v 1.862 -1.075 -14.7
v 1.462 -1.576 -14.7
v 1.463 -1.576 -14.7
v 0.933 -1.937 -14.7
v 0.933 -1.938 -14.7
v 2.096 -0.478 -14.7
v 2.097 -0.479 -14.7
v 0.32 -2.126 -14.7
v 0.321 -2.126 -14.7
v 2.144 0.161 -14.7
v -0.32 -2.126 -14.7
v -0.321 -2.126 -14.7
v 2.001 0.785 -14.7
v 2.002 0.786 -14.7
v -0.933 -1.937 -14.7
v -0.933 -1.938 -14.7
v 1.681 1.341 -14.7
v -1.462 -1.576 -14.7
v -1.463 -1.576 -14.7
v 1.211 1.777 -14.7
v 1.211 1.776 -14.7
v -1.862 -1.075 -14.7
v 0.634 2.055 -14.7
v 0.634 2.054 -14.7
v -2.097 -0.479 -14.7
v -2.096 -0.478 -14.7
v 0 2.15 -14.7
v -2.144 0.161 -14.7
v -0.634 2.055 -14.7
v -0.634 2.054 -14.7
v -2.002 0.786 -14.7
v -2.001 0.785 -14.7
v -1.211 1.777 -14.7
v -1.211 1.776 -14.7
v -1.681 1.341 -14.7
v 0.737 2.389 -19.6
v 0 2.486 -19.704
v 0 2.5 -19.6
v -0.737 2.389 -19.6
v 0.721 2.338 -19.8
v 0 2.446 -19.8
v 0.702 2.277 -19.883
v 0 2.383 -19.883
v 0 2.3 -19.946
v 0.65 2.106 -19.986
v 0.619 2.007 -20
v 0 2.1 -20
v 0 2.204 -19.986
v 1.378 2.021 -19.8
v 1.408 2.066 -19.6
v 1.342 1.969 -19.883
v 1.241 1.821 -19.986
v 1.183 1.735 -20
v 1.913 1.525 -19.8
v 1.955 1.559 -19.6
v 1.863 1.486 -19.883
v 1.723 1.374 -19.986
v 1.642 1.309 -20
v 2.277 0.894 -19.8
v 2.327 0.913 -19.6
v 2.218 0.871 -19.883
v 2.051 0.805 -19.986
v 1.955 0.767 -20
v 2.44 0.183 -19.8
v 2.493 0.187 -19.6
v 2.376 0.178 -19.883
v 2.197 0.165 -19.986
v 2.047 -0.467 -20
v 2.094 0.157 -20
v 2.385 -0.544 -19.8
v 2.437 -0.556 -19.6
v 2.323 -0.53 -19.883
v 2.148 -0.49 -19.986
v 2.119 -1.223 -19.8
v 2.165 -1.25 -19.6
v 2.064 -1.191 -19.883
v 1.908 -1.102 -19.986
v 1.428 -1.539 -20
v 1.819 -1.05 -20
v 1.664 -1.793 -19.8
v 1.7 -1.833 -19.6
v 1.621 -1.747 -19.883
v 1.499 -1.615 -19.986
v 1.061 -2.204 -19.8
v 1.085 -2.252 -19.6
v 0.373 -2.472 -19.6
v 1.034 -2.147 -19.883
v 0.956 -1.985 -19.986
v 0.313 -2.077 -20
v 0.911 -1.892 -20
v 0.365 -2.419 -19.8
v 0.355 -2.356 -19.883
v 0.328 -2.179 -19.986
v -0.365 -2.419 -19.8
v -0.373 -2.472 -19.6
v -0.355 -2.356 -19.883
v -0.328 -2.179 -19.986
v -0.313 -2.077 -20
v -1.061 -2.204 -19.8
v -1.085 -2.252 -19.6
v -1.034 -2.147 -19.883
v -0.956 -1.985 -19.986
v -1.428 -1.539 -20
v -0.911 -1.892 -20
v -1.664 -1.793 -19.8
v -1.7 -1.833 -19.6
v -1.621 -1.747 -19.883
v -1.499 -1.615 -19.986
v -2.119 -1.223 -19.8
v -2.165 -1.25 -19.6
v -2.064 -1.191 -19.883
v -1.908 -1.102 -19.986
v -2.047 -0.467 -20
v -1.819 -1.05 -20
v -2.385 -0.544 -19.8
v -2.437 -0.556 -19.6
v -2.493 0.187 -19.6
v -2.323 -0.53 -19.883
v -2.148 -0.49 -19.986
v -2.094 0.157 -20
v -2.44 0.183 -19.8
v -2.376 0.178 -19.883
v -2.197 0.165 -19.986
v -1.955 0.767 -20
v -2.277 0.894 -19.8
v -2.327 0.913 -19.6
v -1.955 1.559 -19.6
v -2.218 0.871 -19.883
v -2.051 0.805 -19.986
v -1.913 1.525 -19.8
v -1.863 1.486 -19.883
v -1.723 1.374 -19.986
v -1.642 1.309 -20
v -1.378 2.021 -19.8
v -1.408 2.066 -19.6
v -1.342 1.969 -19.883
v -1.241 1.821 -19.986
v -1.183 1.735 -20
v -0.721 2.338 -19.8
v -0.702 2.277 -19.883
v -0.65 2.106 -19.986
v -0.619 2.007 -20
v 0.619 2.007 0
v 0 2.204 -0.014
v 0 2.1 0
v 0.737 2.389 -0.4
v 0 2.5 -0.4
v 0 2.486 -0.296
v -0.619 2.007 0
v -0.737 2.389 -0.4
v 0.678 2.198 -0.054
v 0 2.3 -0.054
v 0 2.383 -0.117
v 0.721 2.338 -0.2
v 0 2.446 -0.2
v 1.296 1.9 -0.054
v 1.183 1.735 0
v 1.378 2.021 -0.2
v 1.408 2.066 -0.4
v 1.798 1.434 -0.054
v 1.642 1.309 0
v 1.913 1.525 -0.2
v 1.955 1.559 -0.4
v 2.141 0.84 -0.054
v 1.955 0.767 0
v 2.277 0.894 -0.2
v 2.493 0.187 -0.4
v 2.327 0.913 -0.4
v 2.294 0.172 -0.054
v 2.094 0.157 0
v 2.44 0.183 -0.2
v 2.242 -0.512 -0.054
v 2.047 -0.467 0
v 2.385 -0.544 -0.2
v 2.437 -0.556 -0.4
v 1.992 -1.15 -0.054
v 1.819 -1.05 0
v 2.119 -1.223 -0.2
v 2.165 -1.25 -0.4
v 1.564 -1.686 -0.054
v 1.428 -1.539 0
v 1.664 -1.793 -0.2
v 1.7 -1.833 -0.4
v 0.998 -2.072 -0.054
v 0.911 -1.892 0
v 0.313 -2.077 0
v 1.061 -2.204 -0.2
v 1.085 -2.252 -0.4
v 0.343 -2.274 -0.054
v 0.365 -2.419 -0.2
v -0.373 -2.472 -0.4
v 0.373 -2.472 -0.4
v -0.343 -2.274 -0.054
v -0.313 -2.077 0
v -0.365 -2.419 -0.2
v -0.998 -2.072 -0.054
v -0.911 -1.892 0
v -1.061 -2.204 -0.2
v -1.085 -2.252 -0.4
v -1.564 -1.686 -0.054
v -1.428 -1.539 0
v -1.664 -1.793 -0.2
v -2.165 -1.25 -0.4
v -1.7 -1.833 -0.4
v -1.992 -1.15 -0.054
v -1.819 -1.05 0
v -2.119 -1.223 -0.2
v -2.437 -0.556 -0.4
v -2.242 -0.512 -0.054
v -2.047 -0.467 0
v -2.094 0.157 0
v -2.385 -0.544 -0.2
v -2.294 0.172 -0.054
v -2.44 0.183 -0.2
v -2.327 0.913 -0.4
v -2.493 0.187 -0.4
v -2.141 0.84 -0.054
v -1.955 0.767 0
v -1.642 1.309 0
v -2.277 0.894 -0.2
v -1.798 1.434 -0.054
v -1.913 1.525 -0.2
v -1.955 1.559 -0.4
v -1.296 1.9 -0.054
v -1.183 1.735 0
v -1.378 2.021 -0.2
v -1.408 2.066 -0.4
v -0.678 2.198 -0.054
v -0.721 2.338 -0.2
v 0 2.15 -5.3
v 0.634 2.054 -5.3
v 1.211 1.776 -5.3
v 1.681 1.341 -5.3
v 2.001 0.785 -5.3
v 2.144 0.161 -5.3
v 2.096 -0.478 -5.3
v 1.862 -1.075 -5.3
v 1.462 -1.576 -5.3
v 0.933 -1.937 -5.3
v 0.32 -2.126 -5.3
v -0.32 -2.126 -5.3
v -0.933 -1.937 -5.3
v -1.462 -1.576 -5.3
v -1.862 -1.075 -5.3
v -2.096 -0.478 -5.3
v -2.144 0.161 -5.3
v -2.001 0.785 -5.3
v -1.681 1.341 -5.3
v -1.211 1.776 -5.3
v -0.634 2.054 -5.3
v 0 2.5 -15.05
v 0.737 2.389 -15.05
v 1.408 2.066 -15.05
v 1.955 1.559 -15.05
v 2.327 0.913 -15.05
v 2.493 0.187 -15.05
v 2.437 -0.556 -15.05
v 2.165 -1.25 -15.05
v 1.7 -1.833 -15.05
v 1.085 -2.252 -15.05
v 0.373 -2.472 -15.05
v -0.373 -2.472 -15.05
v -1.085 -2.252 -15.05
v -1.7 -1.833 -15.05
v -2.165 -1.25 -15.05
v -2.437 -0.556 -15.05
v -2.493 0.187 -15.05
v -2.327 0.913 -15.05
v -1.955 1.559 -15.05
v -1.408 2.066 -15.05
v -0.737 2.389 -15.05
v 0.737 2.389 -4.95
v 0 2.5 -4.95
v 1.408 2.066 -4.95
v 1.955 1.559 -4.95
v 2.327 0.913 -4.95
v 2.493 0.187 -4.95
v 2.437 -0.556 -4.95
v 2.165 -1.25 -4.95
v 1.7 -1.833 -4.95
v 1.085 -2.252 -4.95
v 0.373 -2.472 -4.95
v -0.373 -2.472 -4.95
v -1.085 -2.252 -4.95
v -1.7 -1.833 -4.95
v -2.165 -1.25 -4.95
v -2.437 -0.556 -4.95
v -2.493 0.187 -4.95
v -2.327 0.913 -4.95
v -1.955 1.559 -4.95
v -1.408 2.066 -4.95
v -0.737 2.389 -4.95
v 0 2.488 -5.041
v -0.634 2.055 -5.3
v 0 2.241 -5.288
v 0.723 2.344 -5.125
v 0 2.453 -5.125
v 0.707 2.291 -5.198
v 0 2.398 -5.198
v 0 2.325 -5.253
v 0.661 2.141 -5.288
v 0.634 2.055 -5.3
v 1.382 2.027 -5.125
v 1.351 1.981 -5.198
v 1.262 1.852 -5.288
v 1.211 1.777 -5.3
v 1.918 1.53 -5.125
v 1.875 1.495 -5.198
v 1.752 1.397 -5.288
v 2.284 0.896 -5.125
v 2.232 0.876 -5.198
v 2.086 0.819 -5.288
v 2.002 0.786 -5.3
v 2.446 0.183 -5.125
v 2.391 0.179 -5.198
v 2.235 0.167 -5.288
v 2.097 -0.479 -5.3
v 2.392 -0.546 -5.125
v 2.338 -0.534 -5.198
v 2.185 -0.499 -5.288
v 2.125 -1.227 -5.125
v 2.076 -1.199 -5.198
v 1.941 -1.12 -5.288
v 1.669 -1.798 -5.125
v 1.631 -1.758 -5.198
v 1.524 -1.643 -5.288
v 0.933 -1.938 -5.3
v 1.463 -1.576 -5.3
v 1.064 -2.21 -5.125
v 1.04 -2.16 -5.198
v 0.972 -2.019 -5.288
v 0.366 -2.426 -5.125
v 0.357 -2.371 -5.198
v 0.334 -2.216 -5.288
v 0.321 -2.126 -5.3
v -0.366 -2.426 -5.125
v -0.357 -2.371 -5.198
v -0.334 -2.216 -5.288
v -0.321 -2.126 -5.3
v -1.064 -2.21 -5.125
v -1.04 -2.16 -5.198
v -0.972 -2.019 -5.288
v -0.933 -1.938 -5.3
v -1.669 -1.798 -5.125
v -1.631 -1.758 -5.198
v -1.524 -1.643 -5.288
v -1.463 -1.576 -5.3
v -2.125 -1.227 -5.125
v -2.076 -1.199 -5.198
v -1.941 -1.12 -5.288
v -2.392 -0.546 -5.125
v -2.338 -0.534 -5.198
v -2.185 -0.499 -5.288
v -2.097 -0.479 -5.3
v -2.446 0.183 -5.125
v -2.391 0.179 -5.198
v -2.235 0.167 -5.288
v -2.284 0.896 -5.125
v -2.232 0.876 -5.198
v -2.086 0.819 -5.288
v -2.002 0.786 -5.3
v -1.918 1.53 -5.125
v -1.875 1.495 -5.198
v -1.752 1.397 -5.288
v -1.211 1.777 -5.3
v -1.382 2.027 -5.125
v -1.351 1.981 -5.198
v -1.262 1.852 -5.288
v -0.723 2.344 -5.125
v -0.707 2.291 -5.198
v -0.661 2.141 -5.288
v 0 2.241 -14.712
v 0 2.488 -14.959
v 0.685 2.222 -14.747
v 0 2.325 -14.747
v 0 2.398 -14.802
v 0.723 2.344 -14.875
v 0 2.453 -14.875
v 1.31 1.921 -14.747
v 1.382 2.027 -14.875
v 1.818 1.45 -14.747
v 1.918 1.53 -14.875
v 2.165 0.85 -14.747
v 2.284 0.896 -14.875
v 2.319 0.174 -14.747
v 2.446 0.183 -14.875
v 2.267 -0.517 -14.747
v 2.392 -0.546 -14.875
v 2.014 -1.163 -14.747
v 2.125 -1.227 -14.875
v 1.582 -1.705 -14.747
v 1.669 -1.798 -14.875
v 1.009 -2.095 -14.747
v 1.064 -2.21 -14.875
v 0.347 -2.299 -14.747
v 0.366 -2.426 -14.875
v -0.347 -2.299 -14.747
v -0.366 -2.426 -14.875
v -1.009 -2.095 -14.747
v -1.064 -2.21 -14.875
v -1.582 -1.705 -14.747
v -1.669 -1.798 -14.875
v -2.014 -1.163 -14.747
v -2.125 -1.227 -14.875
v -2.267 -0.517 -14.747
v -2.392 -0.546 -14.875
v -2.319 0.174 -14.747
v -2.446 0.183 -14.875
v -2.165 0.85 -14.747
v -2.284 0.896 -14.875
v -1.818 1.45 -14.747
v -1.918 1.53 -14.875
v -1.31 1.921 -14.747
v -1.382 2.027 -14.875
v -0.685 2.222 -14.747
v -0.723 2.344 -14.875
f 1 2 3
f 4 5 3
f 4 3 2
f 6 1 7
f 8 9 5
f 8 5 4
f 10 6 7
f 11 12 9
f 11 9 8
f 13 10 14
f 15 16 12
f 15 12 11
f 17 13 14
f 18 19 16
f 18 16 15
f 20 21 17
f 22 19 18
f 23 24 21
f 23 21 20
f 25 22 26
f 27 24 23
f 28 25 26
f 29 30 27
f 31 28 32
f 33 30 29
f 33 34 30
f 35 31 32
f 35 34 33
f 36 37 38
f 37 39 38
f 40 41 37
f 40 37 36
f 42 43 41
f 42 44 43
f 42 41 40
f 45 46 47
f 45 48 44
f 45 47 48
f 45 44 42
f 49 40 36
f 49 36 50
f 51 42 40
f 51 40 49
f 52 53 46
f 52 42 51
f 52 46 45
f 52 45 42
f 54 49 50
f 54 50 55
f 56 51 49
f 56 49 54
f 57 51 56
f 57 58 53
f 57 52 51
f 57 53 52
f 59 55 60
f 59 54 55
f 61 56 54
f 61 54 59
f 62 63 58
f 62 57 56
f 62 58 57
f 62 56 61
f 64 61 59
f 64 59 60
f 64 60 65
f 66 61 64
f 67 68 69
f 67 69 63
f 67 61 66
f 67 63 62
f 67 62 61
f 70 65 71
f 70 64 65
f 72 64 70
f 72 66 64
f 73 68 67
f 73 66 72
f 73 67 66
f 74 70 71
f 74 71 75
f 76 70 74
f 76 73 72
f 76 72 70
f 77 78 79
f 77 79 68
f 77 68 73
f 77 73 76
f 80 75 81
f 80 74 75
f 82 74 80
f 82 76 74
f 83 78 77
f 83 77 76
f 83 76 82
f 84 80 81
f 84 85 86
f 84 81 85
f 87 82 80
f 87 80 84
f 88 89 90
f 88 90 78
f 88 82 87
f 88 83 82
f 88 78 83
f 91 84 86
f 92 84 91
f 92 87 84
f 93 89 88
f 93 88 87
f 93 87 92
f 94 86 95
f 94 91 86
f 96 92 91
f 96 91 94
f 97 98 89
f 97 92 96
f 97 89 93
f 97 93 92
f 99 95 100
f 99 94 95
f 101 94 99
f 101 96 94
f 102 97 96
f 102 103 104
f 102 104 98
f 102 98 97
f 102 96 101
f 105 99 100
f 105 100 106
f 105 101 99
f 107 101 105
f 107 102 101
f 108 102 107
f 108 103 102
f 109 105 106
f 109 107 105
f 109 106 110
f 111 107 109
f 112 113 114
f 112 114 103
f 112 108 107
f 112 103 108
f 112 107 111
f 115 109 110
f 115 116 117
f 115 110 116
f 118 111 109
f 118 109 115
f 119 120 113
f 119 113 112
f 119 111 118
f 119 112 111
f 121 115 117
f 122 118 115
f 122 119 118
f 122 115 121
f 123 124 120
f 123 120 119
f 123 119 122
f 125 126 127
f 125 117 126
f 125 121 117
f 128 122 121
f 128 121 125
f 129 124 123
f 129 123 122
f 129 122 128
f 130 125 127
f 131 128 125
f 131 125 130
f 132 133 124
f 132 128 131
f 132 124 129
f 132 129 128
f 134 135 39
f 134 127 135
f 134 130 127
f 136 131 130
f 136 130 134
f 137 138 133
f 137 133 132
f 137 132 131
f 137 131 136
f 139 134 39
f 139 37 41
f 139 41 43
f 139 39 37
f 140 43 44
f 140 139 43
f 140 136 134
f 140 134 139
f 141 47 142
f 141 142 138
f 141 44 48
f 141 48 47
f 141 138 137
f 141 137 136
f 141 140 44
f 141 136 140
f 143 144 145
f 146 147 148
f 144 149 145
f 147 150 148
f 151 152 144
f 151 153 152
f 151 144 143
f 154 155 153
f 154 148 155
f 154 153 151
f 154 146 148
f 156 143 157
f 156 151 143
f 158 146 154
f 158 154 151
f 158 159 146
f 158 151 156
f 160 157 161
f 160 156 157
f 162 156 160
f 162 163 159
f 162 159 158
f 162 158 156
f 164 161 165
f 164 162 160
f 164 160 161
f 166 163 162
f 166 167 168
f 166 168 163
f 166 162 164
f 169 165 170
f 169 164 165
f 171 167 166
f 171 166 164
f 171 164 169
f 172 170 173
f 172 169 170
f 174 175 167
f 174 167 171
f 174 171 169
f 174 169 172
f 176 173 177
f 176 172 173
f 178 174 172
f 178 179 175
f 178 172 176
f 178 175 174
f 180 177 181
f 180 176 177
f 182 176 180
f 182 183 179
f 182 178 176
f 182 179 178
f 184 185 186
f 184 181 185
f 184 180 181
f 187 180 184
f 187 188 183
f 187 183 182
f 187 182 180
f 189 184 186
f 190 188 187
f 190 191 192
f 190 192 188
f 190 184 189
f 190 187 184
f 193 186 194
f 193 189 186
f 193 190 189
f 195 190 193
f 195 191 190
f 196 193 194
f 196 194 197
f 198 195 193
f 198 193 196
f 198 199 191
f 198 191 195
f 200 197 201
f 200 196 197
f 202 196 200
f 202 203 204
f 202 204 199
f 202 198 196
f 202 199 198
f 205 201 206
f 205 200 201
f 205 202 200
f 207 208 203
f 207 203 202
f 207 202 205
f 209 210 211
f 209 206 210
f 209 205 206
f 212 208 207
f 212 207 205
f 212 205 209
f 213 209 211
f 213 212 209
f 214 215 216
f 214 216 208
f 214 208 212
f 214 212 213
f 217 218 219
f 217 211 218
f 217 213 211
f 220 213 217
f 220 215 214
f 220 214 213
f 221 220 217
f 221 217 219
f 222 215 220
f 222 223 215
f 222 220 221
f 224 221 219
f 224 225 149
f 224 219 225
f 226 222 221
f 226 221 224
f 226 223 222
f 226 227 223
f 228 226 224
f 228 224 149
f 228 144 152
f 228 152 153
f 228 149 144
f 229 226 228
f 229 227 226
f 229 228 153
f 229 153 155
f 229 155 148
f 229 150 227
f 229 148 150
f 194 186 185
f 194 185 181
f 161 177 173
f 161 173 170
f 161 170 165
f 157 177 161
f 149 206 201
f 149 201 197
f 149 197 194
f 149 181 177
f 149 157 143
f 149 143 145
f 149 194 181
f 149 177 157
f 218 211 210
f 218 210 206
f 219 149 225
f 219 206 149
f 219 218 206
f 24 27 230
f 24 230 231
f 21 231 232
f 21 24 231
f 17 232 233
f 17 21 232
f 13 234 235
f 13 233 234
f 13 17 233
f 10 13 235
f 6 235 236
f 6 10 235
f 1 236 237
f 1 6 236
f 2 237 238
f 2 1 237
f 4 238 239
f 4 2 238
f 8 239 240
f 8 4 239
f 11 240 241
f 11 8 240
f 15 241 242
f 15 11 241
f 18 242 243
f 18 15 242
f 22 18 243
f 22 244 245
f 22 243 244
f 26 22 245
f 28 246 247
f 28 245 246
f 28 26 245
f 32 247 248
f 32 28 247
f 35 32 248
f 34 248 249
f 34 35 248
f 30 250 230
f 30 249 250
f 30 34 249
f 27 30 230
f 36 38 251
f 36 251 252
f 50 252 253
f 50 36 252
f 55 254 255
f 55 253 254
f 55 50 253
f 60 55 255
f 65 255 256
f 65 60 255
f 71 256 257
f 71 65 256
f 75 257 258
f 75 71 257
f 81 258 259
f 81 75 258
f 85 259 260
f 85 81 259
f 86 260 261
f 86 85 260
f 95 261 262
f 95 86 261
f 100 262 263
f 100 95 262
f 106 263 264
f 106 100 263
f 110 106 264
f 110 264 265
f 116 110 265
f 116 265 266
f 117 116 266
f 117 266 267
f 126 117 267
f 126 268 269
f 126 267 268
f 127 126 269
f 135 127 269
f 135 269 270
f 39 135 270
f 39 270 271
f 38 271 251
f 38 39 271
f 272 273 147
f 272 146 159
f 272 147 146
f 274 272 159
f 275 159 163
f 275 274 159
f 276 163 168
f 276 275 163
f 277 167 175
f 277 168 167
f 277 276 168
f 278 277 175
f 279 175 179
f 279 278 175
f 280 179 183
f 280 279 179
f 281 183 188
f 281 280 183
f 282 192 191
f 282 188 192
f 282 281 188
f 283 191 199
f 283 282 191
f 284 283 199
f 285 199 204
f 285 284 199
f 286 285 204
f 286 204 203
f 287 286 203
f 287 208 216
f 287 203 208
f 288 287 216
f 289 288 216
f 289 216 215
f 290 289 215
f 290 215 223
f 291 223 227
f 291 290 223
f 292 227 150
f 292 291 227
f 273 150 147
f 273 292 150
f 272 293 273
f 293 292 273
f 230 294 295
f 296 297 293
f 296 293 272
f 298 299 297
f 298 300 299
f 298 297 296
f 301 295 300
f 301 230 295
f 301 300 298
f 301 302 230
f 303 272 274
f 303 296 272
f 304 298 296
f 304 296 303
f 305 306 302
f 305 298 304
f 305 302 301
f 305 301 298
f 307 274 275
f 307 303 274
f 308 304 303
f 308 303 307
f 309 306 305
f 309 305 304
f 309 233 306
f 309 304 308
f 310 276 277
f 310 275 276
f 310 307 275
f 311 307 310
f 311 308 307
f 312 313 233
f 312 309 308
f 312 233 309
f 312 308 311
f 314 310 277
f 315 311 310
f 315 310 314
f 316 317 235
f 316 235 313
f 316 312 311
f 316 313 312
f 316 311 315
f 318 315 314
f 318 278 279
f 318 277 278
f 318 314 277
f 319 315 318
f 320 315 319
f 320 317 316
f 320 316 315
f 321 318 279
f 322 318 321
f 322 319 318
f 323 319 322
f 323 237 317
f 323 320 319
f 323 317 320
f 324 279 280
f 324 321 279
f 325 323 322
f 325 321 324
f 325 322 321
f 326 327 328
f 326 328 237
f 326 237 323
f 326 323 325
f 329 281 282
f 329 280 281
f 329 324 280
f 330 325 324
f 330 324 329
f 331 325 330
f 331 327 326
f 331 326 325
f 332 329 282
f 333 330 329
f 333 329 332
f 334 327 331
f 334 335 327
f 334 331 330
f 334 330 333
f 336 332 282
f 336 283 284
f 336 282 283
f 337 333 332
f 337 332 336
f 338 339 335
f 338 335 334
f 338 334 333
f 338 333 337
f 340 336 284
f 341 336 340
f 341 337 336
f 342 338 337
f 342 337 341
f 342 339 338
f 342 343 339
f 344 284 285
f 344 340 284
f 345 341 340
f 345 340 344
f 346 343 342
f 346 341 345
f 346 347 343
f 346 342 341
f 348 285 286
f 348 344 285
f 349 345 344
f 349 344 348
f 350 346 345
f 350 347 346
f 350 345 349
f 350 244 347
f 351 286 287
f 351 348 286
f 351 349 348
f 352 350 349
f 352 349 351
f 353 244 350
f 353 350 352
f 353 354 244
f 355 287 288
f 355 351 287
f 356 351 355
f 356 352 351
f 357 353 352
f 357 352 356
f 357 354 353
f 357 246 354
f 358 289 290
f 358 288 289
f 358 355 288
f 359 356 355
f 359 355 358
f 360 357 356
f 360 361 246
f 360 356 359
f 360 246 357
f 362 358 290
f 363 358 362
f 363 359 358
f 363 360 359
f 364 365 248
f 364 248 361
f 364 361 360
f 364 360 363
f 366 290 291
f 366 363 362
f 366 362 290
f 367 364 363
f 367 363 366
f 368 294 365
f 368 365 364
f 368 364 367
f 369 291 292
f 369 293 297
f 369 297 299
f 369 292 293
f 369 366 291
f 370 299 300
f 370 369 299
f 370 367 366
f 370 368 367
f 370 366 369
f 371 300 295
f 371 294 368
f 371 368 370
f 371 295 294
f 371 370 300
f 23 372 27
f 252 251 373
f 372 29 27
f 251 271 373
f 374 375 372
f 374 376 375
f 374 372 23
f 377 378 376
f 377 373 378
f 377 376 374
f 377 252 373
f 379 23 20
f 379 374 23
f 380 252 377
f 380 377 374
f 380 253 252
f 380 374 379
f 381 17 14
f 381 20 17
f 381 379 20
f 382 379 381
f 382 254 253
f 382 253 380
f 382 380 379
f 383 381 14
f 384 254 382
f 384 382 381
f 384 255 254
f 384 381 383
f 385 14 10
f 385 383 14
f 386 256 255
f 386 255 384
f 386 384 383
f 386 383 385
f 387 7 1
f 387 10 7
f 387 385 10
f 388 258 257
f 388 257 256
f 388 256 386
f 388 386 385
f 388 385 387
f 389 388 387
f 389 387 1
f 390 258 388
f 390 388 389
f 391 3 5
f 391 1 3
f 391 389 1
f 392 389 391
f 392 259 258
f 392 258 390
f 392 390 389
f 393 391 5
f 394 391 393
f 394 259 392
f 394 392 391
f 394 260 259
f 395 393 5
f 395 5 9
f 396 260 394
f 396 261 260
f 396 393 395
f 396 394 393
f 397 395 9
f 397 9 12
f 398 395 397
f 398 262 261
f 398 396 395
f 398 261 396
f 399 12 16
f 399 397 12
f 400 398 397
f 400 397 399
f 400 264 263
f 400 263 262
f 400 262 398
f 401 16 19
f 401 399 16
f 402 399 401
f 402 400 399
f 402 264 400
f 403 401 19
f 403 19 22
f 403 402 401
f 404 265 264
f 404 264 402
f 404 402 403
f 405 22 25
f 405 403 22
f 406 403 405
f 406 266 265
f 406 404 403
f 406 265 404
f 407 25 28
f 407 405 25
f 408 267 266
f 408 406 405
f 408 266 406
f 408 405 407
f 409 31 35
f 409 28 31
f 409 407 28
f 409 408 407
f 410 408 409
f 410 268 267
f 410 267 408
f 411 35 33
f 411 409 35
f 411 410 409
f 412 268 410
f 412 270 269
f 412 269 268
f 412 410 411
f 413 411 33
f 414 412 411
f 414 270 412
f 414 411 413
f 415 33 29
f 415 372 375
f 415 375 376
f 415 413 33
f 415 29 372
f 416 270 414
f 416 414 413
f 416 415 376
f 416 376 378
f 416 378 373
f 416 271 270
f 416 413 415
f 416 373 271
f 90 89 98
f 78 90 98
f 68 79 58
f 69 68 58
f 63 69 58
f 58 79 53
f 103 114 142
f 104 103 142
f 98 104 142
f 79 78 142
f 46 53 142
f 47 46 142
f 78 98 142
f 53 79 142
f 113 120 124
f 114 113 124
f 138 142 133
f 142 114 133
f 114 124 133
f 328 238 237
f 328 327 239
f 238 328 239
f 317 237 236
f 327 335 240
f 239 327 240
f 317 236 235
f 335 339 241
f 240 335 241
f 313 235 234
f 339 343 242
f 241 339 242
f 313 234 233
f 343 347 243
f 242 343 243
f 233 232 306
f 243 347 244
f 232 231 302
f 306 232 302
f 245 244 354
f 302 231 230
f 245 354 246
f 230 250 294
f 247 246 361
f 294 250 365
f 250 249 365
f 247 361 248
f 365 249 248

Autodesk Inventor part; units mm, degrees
ref_plane "YZ Plane" through (0, 0, 0) normal (1, 0, 0) x (0, 1, 0)
ref_plane "XZ Plane" through (0, 0, 0) normal (0, 1, 0) x (-1, 0, 0)
ref_plane "XY Plane" through (0, 0, 0) normal (0, 0, 1) x (1, 0, 0)
sketch "Sketch2" plane through (0, 0, 0) normal (1, 0, 0) x (0, 1, 0)
  line L0 (0, 0) -> (2.5, 0)
  line L1 (2.5, 0) -> (2.5, -5.3)
  line L2 (2.5, -5.3) -> (2.15, -5.3)
  line L3 (2.15, -5.3) -> (2.15, -14.7)
  line L4 (2.15, -14.7) -> (2.5, -14.7)
  line L5 (2.5, -14.7) -> (2.5, -20)
  line L6 (2.5, -20) -> (0, -20)
  line L7 (0, -20) -> (0, 0)
  dimension "d1" = 2.5
  dimension "d2" = 5.3
  dimension "d3" = 0.35
  dimension "d4" = 9.4
  dimension "d5" = 0.35
  dimension "d6" = 5.3
  dimension "d7" = 2.5
revolve "Revolution1" add sketch "Sketch2" angle 360 about axis through (0, 0, -20) along (0, 0, 1)
fillet "Fillet4" radius 0.4 2 edges at (0, -2.5, -20) (0, -2.5, 0)
fillet "Fillet5" radius 0.35 2 edges at (0, -2.5, -14.7) (0, -2.5, -5.3)
equation "\"d5\" = d3"
equation "\"d6\" = d2"
equation "\"d7\" = d1"
properties part number "Fusible de 2A"
